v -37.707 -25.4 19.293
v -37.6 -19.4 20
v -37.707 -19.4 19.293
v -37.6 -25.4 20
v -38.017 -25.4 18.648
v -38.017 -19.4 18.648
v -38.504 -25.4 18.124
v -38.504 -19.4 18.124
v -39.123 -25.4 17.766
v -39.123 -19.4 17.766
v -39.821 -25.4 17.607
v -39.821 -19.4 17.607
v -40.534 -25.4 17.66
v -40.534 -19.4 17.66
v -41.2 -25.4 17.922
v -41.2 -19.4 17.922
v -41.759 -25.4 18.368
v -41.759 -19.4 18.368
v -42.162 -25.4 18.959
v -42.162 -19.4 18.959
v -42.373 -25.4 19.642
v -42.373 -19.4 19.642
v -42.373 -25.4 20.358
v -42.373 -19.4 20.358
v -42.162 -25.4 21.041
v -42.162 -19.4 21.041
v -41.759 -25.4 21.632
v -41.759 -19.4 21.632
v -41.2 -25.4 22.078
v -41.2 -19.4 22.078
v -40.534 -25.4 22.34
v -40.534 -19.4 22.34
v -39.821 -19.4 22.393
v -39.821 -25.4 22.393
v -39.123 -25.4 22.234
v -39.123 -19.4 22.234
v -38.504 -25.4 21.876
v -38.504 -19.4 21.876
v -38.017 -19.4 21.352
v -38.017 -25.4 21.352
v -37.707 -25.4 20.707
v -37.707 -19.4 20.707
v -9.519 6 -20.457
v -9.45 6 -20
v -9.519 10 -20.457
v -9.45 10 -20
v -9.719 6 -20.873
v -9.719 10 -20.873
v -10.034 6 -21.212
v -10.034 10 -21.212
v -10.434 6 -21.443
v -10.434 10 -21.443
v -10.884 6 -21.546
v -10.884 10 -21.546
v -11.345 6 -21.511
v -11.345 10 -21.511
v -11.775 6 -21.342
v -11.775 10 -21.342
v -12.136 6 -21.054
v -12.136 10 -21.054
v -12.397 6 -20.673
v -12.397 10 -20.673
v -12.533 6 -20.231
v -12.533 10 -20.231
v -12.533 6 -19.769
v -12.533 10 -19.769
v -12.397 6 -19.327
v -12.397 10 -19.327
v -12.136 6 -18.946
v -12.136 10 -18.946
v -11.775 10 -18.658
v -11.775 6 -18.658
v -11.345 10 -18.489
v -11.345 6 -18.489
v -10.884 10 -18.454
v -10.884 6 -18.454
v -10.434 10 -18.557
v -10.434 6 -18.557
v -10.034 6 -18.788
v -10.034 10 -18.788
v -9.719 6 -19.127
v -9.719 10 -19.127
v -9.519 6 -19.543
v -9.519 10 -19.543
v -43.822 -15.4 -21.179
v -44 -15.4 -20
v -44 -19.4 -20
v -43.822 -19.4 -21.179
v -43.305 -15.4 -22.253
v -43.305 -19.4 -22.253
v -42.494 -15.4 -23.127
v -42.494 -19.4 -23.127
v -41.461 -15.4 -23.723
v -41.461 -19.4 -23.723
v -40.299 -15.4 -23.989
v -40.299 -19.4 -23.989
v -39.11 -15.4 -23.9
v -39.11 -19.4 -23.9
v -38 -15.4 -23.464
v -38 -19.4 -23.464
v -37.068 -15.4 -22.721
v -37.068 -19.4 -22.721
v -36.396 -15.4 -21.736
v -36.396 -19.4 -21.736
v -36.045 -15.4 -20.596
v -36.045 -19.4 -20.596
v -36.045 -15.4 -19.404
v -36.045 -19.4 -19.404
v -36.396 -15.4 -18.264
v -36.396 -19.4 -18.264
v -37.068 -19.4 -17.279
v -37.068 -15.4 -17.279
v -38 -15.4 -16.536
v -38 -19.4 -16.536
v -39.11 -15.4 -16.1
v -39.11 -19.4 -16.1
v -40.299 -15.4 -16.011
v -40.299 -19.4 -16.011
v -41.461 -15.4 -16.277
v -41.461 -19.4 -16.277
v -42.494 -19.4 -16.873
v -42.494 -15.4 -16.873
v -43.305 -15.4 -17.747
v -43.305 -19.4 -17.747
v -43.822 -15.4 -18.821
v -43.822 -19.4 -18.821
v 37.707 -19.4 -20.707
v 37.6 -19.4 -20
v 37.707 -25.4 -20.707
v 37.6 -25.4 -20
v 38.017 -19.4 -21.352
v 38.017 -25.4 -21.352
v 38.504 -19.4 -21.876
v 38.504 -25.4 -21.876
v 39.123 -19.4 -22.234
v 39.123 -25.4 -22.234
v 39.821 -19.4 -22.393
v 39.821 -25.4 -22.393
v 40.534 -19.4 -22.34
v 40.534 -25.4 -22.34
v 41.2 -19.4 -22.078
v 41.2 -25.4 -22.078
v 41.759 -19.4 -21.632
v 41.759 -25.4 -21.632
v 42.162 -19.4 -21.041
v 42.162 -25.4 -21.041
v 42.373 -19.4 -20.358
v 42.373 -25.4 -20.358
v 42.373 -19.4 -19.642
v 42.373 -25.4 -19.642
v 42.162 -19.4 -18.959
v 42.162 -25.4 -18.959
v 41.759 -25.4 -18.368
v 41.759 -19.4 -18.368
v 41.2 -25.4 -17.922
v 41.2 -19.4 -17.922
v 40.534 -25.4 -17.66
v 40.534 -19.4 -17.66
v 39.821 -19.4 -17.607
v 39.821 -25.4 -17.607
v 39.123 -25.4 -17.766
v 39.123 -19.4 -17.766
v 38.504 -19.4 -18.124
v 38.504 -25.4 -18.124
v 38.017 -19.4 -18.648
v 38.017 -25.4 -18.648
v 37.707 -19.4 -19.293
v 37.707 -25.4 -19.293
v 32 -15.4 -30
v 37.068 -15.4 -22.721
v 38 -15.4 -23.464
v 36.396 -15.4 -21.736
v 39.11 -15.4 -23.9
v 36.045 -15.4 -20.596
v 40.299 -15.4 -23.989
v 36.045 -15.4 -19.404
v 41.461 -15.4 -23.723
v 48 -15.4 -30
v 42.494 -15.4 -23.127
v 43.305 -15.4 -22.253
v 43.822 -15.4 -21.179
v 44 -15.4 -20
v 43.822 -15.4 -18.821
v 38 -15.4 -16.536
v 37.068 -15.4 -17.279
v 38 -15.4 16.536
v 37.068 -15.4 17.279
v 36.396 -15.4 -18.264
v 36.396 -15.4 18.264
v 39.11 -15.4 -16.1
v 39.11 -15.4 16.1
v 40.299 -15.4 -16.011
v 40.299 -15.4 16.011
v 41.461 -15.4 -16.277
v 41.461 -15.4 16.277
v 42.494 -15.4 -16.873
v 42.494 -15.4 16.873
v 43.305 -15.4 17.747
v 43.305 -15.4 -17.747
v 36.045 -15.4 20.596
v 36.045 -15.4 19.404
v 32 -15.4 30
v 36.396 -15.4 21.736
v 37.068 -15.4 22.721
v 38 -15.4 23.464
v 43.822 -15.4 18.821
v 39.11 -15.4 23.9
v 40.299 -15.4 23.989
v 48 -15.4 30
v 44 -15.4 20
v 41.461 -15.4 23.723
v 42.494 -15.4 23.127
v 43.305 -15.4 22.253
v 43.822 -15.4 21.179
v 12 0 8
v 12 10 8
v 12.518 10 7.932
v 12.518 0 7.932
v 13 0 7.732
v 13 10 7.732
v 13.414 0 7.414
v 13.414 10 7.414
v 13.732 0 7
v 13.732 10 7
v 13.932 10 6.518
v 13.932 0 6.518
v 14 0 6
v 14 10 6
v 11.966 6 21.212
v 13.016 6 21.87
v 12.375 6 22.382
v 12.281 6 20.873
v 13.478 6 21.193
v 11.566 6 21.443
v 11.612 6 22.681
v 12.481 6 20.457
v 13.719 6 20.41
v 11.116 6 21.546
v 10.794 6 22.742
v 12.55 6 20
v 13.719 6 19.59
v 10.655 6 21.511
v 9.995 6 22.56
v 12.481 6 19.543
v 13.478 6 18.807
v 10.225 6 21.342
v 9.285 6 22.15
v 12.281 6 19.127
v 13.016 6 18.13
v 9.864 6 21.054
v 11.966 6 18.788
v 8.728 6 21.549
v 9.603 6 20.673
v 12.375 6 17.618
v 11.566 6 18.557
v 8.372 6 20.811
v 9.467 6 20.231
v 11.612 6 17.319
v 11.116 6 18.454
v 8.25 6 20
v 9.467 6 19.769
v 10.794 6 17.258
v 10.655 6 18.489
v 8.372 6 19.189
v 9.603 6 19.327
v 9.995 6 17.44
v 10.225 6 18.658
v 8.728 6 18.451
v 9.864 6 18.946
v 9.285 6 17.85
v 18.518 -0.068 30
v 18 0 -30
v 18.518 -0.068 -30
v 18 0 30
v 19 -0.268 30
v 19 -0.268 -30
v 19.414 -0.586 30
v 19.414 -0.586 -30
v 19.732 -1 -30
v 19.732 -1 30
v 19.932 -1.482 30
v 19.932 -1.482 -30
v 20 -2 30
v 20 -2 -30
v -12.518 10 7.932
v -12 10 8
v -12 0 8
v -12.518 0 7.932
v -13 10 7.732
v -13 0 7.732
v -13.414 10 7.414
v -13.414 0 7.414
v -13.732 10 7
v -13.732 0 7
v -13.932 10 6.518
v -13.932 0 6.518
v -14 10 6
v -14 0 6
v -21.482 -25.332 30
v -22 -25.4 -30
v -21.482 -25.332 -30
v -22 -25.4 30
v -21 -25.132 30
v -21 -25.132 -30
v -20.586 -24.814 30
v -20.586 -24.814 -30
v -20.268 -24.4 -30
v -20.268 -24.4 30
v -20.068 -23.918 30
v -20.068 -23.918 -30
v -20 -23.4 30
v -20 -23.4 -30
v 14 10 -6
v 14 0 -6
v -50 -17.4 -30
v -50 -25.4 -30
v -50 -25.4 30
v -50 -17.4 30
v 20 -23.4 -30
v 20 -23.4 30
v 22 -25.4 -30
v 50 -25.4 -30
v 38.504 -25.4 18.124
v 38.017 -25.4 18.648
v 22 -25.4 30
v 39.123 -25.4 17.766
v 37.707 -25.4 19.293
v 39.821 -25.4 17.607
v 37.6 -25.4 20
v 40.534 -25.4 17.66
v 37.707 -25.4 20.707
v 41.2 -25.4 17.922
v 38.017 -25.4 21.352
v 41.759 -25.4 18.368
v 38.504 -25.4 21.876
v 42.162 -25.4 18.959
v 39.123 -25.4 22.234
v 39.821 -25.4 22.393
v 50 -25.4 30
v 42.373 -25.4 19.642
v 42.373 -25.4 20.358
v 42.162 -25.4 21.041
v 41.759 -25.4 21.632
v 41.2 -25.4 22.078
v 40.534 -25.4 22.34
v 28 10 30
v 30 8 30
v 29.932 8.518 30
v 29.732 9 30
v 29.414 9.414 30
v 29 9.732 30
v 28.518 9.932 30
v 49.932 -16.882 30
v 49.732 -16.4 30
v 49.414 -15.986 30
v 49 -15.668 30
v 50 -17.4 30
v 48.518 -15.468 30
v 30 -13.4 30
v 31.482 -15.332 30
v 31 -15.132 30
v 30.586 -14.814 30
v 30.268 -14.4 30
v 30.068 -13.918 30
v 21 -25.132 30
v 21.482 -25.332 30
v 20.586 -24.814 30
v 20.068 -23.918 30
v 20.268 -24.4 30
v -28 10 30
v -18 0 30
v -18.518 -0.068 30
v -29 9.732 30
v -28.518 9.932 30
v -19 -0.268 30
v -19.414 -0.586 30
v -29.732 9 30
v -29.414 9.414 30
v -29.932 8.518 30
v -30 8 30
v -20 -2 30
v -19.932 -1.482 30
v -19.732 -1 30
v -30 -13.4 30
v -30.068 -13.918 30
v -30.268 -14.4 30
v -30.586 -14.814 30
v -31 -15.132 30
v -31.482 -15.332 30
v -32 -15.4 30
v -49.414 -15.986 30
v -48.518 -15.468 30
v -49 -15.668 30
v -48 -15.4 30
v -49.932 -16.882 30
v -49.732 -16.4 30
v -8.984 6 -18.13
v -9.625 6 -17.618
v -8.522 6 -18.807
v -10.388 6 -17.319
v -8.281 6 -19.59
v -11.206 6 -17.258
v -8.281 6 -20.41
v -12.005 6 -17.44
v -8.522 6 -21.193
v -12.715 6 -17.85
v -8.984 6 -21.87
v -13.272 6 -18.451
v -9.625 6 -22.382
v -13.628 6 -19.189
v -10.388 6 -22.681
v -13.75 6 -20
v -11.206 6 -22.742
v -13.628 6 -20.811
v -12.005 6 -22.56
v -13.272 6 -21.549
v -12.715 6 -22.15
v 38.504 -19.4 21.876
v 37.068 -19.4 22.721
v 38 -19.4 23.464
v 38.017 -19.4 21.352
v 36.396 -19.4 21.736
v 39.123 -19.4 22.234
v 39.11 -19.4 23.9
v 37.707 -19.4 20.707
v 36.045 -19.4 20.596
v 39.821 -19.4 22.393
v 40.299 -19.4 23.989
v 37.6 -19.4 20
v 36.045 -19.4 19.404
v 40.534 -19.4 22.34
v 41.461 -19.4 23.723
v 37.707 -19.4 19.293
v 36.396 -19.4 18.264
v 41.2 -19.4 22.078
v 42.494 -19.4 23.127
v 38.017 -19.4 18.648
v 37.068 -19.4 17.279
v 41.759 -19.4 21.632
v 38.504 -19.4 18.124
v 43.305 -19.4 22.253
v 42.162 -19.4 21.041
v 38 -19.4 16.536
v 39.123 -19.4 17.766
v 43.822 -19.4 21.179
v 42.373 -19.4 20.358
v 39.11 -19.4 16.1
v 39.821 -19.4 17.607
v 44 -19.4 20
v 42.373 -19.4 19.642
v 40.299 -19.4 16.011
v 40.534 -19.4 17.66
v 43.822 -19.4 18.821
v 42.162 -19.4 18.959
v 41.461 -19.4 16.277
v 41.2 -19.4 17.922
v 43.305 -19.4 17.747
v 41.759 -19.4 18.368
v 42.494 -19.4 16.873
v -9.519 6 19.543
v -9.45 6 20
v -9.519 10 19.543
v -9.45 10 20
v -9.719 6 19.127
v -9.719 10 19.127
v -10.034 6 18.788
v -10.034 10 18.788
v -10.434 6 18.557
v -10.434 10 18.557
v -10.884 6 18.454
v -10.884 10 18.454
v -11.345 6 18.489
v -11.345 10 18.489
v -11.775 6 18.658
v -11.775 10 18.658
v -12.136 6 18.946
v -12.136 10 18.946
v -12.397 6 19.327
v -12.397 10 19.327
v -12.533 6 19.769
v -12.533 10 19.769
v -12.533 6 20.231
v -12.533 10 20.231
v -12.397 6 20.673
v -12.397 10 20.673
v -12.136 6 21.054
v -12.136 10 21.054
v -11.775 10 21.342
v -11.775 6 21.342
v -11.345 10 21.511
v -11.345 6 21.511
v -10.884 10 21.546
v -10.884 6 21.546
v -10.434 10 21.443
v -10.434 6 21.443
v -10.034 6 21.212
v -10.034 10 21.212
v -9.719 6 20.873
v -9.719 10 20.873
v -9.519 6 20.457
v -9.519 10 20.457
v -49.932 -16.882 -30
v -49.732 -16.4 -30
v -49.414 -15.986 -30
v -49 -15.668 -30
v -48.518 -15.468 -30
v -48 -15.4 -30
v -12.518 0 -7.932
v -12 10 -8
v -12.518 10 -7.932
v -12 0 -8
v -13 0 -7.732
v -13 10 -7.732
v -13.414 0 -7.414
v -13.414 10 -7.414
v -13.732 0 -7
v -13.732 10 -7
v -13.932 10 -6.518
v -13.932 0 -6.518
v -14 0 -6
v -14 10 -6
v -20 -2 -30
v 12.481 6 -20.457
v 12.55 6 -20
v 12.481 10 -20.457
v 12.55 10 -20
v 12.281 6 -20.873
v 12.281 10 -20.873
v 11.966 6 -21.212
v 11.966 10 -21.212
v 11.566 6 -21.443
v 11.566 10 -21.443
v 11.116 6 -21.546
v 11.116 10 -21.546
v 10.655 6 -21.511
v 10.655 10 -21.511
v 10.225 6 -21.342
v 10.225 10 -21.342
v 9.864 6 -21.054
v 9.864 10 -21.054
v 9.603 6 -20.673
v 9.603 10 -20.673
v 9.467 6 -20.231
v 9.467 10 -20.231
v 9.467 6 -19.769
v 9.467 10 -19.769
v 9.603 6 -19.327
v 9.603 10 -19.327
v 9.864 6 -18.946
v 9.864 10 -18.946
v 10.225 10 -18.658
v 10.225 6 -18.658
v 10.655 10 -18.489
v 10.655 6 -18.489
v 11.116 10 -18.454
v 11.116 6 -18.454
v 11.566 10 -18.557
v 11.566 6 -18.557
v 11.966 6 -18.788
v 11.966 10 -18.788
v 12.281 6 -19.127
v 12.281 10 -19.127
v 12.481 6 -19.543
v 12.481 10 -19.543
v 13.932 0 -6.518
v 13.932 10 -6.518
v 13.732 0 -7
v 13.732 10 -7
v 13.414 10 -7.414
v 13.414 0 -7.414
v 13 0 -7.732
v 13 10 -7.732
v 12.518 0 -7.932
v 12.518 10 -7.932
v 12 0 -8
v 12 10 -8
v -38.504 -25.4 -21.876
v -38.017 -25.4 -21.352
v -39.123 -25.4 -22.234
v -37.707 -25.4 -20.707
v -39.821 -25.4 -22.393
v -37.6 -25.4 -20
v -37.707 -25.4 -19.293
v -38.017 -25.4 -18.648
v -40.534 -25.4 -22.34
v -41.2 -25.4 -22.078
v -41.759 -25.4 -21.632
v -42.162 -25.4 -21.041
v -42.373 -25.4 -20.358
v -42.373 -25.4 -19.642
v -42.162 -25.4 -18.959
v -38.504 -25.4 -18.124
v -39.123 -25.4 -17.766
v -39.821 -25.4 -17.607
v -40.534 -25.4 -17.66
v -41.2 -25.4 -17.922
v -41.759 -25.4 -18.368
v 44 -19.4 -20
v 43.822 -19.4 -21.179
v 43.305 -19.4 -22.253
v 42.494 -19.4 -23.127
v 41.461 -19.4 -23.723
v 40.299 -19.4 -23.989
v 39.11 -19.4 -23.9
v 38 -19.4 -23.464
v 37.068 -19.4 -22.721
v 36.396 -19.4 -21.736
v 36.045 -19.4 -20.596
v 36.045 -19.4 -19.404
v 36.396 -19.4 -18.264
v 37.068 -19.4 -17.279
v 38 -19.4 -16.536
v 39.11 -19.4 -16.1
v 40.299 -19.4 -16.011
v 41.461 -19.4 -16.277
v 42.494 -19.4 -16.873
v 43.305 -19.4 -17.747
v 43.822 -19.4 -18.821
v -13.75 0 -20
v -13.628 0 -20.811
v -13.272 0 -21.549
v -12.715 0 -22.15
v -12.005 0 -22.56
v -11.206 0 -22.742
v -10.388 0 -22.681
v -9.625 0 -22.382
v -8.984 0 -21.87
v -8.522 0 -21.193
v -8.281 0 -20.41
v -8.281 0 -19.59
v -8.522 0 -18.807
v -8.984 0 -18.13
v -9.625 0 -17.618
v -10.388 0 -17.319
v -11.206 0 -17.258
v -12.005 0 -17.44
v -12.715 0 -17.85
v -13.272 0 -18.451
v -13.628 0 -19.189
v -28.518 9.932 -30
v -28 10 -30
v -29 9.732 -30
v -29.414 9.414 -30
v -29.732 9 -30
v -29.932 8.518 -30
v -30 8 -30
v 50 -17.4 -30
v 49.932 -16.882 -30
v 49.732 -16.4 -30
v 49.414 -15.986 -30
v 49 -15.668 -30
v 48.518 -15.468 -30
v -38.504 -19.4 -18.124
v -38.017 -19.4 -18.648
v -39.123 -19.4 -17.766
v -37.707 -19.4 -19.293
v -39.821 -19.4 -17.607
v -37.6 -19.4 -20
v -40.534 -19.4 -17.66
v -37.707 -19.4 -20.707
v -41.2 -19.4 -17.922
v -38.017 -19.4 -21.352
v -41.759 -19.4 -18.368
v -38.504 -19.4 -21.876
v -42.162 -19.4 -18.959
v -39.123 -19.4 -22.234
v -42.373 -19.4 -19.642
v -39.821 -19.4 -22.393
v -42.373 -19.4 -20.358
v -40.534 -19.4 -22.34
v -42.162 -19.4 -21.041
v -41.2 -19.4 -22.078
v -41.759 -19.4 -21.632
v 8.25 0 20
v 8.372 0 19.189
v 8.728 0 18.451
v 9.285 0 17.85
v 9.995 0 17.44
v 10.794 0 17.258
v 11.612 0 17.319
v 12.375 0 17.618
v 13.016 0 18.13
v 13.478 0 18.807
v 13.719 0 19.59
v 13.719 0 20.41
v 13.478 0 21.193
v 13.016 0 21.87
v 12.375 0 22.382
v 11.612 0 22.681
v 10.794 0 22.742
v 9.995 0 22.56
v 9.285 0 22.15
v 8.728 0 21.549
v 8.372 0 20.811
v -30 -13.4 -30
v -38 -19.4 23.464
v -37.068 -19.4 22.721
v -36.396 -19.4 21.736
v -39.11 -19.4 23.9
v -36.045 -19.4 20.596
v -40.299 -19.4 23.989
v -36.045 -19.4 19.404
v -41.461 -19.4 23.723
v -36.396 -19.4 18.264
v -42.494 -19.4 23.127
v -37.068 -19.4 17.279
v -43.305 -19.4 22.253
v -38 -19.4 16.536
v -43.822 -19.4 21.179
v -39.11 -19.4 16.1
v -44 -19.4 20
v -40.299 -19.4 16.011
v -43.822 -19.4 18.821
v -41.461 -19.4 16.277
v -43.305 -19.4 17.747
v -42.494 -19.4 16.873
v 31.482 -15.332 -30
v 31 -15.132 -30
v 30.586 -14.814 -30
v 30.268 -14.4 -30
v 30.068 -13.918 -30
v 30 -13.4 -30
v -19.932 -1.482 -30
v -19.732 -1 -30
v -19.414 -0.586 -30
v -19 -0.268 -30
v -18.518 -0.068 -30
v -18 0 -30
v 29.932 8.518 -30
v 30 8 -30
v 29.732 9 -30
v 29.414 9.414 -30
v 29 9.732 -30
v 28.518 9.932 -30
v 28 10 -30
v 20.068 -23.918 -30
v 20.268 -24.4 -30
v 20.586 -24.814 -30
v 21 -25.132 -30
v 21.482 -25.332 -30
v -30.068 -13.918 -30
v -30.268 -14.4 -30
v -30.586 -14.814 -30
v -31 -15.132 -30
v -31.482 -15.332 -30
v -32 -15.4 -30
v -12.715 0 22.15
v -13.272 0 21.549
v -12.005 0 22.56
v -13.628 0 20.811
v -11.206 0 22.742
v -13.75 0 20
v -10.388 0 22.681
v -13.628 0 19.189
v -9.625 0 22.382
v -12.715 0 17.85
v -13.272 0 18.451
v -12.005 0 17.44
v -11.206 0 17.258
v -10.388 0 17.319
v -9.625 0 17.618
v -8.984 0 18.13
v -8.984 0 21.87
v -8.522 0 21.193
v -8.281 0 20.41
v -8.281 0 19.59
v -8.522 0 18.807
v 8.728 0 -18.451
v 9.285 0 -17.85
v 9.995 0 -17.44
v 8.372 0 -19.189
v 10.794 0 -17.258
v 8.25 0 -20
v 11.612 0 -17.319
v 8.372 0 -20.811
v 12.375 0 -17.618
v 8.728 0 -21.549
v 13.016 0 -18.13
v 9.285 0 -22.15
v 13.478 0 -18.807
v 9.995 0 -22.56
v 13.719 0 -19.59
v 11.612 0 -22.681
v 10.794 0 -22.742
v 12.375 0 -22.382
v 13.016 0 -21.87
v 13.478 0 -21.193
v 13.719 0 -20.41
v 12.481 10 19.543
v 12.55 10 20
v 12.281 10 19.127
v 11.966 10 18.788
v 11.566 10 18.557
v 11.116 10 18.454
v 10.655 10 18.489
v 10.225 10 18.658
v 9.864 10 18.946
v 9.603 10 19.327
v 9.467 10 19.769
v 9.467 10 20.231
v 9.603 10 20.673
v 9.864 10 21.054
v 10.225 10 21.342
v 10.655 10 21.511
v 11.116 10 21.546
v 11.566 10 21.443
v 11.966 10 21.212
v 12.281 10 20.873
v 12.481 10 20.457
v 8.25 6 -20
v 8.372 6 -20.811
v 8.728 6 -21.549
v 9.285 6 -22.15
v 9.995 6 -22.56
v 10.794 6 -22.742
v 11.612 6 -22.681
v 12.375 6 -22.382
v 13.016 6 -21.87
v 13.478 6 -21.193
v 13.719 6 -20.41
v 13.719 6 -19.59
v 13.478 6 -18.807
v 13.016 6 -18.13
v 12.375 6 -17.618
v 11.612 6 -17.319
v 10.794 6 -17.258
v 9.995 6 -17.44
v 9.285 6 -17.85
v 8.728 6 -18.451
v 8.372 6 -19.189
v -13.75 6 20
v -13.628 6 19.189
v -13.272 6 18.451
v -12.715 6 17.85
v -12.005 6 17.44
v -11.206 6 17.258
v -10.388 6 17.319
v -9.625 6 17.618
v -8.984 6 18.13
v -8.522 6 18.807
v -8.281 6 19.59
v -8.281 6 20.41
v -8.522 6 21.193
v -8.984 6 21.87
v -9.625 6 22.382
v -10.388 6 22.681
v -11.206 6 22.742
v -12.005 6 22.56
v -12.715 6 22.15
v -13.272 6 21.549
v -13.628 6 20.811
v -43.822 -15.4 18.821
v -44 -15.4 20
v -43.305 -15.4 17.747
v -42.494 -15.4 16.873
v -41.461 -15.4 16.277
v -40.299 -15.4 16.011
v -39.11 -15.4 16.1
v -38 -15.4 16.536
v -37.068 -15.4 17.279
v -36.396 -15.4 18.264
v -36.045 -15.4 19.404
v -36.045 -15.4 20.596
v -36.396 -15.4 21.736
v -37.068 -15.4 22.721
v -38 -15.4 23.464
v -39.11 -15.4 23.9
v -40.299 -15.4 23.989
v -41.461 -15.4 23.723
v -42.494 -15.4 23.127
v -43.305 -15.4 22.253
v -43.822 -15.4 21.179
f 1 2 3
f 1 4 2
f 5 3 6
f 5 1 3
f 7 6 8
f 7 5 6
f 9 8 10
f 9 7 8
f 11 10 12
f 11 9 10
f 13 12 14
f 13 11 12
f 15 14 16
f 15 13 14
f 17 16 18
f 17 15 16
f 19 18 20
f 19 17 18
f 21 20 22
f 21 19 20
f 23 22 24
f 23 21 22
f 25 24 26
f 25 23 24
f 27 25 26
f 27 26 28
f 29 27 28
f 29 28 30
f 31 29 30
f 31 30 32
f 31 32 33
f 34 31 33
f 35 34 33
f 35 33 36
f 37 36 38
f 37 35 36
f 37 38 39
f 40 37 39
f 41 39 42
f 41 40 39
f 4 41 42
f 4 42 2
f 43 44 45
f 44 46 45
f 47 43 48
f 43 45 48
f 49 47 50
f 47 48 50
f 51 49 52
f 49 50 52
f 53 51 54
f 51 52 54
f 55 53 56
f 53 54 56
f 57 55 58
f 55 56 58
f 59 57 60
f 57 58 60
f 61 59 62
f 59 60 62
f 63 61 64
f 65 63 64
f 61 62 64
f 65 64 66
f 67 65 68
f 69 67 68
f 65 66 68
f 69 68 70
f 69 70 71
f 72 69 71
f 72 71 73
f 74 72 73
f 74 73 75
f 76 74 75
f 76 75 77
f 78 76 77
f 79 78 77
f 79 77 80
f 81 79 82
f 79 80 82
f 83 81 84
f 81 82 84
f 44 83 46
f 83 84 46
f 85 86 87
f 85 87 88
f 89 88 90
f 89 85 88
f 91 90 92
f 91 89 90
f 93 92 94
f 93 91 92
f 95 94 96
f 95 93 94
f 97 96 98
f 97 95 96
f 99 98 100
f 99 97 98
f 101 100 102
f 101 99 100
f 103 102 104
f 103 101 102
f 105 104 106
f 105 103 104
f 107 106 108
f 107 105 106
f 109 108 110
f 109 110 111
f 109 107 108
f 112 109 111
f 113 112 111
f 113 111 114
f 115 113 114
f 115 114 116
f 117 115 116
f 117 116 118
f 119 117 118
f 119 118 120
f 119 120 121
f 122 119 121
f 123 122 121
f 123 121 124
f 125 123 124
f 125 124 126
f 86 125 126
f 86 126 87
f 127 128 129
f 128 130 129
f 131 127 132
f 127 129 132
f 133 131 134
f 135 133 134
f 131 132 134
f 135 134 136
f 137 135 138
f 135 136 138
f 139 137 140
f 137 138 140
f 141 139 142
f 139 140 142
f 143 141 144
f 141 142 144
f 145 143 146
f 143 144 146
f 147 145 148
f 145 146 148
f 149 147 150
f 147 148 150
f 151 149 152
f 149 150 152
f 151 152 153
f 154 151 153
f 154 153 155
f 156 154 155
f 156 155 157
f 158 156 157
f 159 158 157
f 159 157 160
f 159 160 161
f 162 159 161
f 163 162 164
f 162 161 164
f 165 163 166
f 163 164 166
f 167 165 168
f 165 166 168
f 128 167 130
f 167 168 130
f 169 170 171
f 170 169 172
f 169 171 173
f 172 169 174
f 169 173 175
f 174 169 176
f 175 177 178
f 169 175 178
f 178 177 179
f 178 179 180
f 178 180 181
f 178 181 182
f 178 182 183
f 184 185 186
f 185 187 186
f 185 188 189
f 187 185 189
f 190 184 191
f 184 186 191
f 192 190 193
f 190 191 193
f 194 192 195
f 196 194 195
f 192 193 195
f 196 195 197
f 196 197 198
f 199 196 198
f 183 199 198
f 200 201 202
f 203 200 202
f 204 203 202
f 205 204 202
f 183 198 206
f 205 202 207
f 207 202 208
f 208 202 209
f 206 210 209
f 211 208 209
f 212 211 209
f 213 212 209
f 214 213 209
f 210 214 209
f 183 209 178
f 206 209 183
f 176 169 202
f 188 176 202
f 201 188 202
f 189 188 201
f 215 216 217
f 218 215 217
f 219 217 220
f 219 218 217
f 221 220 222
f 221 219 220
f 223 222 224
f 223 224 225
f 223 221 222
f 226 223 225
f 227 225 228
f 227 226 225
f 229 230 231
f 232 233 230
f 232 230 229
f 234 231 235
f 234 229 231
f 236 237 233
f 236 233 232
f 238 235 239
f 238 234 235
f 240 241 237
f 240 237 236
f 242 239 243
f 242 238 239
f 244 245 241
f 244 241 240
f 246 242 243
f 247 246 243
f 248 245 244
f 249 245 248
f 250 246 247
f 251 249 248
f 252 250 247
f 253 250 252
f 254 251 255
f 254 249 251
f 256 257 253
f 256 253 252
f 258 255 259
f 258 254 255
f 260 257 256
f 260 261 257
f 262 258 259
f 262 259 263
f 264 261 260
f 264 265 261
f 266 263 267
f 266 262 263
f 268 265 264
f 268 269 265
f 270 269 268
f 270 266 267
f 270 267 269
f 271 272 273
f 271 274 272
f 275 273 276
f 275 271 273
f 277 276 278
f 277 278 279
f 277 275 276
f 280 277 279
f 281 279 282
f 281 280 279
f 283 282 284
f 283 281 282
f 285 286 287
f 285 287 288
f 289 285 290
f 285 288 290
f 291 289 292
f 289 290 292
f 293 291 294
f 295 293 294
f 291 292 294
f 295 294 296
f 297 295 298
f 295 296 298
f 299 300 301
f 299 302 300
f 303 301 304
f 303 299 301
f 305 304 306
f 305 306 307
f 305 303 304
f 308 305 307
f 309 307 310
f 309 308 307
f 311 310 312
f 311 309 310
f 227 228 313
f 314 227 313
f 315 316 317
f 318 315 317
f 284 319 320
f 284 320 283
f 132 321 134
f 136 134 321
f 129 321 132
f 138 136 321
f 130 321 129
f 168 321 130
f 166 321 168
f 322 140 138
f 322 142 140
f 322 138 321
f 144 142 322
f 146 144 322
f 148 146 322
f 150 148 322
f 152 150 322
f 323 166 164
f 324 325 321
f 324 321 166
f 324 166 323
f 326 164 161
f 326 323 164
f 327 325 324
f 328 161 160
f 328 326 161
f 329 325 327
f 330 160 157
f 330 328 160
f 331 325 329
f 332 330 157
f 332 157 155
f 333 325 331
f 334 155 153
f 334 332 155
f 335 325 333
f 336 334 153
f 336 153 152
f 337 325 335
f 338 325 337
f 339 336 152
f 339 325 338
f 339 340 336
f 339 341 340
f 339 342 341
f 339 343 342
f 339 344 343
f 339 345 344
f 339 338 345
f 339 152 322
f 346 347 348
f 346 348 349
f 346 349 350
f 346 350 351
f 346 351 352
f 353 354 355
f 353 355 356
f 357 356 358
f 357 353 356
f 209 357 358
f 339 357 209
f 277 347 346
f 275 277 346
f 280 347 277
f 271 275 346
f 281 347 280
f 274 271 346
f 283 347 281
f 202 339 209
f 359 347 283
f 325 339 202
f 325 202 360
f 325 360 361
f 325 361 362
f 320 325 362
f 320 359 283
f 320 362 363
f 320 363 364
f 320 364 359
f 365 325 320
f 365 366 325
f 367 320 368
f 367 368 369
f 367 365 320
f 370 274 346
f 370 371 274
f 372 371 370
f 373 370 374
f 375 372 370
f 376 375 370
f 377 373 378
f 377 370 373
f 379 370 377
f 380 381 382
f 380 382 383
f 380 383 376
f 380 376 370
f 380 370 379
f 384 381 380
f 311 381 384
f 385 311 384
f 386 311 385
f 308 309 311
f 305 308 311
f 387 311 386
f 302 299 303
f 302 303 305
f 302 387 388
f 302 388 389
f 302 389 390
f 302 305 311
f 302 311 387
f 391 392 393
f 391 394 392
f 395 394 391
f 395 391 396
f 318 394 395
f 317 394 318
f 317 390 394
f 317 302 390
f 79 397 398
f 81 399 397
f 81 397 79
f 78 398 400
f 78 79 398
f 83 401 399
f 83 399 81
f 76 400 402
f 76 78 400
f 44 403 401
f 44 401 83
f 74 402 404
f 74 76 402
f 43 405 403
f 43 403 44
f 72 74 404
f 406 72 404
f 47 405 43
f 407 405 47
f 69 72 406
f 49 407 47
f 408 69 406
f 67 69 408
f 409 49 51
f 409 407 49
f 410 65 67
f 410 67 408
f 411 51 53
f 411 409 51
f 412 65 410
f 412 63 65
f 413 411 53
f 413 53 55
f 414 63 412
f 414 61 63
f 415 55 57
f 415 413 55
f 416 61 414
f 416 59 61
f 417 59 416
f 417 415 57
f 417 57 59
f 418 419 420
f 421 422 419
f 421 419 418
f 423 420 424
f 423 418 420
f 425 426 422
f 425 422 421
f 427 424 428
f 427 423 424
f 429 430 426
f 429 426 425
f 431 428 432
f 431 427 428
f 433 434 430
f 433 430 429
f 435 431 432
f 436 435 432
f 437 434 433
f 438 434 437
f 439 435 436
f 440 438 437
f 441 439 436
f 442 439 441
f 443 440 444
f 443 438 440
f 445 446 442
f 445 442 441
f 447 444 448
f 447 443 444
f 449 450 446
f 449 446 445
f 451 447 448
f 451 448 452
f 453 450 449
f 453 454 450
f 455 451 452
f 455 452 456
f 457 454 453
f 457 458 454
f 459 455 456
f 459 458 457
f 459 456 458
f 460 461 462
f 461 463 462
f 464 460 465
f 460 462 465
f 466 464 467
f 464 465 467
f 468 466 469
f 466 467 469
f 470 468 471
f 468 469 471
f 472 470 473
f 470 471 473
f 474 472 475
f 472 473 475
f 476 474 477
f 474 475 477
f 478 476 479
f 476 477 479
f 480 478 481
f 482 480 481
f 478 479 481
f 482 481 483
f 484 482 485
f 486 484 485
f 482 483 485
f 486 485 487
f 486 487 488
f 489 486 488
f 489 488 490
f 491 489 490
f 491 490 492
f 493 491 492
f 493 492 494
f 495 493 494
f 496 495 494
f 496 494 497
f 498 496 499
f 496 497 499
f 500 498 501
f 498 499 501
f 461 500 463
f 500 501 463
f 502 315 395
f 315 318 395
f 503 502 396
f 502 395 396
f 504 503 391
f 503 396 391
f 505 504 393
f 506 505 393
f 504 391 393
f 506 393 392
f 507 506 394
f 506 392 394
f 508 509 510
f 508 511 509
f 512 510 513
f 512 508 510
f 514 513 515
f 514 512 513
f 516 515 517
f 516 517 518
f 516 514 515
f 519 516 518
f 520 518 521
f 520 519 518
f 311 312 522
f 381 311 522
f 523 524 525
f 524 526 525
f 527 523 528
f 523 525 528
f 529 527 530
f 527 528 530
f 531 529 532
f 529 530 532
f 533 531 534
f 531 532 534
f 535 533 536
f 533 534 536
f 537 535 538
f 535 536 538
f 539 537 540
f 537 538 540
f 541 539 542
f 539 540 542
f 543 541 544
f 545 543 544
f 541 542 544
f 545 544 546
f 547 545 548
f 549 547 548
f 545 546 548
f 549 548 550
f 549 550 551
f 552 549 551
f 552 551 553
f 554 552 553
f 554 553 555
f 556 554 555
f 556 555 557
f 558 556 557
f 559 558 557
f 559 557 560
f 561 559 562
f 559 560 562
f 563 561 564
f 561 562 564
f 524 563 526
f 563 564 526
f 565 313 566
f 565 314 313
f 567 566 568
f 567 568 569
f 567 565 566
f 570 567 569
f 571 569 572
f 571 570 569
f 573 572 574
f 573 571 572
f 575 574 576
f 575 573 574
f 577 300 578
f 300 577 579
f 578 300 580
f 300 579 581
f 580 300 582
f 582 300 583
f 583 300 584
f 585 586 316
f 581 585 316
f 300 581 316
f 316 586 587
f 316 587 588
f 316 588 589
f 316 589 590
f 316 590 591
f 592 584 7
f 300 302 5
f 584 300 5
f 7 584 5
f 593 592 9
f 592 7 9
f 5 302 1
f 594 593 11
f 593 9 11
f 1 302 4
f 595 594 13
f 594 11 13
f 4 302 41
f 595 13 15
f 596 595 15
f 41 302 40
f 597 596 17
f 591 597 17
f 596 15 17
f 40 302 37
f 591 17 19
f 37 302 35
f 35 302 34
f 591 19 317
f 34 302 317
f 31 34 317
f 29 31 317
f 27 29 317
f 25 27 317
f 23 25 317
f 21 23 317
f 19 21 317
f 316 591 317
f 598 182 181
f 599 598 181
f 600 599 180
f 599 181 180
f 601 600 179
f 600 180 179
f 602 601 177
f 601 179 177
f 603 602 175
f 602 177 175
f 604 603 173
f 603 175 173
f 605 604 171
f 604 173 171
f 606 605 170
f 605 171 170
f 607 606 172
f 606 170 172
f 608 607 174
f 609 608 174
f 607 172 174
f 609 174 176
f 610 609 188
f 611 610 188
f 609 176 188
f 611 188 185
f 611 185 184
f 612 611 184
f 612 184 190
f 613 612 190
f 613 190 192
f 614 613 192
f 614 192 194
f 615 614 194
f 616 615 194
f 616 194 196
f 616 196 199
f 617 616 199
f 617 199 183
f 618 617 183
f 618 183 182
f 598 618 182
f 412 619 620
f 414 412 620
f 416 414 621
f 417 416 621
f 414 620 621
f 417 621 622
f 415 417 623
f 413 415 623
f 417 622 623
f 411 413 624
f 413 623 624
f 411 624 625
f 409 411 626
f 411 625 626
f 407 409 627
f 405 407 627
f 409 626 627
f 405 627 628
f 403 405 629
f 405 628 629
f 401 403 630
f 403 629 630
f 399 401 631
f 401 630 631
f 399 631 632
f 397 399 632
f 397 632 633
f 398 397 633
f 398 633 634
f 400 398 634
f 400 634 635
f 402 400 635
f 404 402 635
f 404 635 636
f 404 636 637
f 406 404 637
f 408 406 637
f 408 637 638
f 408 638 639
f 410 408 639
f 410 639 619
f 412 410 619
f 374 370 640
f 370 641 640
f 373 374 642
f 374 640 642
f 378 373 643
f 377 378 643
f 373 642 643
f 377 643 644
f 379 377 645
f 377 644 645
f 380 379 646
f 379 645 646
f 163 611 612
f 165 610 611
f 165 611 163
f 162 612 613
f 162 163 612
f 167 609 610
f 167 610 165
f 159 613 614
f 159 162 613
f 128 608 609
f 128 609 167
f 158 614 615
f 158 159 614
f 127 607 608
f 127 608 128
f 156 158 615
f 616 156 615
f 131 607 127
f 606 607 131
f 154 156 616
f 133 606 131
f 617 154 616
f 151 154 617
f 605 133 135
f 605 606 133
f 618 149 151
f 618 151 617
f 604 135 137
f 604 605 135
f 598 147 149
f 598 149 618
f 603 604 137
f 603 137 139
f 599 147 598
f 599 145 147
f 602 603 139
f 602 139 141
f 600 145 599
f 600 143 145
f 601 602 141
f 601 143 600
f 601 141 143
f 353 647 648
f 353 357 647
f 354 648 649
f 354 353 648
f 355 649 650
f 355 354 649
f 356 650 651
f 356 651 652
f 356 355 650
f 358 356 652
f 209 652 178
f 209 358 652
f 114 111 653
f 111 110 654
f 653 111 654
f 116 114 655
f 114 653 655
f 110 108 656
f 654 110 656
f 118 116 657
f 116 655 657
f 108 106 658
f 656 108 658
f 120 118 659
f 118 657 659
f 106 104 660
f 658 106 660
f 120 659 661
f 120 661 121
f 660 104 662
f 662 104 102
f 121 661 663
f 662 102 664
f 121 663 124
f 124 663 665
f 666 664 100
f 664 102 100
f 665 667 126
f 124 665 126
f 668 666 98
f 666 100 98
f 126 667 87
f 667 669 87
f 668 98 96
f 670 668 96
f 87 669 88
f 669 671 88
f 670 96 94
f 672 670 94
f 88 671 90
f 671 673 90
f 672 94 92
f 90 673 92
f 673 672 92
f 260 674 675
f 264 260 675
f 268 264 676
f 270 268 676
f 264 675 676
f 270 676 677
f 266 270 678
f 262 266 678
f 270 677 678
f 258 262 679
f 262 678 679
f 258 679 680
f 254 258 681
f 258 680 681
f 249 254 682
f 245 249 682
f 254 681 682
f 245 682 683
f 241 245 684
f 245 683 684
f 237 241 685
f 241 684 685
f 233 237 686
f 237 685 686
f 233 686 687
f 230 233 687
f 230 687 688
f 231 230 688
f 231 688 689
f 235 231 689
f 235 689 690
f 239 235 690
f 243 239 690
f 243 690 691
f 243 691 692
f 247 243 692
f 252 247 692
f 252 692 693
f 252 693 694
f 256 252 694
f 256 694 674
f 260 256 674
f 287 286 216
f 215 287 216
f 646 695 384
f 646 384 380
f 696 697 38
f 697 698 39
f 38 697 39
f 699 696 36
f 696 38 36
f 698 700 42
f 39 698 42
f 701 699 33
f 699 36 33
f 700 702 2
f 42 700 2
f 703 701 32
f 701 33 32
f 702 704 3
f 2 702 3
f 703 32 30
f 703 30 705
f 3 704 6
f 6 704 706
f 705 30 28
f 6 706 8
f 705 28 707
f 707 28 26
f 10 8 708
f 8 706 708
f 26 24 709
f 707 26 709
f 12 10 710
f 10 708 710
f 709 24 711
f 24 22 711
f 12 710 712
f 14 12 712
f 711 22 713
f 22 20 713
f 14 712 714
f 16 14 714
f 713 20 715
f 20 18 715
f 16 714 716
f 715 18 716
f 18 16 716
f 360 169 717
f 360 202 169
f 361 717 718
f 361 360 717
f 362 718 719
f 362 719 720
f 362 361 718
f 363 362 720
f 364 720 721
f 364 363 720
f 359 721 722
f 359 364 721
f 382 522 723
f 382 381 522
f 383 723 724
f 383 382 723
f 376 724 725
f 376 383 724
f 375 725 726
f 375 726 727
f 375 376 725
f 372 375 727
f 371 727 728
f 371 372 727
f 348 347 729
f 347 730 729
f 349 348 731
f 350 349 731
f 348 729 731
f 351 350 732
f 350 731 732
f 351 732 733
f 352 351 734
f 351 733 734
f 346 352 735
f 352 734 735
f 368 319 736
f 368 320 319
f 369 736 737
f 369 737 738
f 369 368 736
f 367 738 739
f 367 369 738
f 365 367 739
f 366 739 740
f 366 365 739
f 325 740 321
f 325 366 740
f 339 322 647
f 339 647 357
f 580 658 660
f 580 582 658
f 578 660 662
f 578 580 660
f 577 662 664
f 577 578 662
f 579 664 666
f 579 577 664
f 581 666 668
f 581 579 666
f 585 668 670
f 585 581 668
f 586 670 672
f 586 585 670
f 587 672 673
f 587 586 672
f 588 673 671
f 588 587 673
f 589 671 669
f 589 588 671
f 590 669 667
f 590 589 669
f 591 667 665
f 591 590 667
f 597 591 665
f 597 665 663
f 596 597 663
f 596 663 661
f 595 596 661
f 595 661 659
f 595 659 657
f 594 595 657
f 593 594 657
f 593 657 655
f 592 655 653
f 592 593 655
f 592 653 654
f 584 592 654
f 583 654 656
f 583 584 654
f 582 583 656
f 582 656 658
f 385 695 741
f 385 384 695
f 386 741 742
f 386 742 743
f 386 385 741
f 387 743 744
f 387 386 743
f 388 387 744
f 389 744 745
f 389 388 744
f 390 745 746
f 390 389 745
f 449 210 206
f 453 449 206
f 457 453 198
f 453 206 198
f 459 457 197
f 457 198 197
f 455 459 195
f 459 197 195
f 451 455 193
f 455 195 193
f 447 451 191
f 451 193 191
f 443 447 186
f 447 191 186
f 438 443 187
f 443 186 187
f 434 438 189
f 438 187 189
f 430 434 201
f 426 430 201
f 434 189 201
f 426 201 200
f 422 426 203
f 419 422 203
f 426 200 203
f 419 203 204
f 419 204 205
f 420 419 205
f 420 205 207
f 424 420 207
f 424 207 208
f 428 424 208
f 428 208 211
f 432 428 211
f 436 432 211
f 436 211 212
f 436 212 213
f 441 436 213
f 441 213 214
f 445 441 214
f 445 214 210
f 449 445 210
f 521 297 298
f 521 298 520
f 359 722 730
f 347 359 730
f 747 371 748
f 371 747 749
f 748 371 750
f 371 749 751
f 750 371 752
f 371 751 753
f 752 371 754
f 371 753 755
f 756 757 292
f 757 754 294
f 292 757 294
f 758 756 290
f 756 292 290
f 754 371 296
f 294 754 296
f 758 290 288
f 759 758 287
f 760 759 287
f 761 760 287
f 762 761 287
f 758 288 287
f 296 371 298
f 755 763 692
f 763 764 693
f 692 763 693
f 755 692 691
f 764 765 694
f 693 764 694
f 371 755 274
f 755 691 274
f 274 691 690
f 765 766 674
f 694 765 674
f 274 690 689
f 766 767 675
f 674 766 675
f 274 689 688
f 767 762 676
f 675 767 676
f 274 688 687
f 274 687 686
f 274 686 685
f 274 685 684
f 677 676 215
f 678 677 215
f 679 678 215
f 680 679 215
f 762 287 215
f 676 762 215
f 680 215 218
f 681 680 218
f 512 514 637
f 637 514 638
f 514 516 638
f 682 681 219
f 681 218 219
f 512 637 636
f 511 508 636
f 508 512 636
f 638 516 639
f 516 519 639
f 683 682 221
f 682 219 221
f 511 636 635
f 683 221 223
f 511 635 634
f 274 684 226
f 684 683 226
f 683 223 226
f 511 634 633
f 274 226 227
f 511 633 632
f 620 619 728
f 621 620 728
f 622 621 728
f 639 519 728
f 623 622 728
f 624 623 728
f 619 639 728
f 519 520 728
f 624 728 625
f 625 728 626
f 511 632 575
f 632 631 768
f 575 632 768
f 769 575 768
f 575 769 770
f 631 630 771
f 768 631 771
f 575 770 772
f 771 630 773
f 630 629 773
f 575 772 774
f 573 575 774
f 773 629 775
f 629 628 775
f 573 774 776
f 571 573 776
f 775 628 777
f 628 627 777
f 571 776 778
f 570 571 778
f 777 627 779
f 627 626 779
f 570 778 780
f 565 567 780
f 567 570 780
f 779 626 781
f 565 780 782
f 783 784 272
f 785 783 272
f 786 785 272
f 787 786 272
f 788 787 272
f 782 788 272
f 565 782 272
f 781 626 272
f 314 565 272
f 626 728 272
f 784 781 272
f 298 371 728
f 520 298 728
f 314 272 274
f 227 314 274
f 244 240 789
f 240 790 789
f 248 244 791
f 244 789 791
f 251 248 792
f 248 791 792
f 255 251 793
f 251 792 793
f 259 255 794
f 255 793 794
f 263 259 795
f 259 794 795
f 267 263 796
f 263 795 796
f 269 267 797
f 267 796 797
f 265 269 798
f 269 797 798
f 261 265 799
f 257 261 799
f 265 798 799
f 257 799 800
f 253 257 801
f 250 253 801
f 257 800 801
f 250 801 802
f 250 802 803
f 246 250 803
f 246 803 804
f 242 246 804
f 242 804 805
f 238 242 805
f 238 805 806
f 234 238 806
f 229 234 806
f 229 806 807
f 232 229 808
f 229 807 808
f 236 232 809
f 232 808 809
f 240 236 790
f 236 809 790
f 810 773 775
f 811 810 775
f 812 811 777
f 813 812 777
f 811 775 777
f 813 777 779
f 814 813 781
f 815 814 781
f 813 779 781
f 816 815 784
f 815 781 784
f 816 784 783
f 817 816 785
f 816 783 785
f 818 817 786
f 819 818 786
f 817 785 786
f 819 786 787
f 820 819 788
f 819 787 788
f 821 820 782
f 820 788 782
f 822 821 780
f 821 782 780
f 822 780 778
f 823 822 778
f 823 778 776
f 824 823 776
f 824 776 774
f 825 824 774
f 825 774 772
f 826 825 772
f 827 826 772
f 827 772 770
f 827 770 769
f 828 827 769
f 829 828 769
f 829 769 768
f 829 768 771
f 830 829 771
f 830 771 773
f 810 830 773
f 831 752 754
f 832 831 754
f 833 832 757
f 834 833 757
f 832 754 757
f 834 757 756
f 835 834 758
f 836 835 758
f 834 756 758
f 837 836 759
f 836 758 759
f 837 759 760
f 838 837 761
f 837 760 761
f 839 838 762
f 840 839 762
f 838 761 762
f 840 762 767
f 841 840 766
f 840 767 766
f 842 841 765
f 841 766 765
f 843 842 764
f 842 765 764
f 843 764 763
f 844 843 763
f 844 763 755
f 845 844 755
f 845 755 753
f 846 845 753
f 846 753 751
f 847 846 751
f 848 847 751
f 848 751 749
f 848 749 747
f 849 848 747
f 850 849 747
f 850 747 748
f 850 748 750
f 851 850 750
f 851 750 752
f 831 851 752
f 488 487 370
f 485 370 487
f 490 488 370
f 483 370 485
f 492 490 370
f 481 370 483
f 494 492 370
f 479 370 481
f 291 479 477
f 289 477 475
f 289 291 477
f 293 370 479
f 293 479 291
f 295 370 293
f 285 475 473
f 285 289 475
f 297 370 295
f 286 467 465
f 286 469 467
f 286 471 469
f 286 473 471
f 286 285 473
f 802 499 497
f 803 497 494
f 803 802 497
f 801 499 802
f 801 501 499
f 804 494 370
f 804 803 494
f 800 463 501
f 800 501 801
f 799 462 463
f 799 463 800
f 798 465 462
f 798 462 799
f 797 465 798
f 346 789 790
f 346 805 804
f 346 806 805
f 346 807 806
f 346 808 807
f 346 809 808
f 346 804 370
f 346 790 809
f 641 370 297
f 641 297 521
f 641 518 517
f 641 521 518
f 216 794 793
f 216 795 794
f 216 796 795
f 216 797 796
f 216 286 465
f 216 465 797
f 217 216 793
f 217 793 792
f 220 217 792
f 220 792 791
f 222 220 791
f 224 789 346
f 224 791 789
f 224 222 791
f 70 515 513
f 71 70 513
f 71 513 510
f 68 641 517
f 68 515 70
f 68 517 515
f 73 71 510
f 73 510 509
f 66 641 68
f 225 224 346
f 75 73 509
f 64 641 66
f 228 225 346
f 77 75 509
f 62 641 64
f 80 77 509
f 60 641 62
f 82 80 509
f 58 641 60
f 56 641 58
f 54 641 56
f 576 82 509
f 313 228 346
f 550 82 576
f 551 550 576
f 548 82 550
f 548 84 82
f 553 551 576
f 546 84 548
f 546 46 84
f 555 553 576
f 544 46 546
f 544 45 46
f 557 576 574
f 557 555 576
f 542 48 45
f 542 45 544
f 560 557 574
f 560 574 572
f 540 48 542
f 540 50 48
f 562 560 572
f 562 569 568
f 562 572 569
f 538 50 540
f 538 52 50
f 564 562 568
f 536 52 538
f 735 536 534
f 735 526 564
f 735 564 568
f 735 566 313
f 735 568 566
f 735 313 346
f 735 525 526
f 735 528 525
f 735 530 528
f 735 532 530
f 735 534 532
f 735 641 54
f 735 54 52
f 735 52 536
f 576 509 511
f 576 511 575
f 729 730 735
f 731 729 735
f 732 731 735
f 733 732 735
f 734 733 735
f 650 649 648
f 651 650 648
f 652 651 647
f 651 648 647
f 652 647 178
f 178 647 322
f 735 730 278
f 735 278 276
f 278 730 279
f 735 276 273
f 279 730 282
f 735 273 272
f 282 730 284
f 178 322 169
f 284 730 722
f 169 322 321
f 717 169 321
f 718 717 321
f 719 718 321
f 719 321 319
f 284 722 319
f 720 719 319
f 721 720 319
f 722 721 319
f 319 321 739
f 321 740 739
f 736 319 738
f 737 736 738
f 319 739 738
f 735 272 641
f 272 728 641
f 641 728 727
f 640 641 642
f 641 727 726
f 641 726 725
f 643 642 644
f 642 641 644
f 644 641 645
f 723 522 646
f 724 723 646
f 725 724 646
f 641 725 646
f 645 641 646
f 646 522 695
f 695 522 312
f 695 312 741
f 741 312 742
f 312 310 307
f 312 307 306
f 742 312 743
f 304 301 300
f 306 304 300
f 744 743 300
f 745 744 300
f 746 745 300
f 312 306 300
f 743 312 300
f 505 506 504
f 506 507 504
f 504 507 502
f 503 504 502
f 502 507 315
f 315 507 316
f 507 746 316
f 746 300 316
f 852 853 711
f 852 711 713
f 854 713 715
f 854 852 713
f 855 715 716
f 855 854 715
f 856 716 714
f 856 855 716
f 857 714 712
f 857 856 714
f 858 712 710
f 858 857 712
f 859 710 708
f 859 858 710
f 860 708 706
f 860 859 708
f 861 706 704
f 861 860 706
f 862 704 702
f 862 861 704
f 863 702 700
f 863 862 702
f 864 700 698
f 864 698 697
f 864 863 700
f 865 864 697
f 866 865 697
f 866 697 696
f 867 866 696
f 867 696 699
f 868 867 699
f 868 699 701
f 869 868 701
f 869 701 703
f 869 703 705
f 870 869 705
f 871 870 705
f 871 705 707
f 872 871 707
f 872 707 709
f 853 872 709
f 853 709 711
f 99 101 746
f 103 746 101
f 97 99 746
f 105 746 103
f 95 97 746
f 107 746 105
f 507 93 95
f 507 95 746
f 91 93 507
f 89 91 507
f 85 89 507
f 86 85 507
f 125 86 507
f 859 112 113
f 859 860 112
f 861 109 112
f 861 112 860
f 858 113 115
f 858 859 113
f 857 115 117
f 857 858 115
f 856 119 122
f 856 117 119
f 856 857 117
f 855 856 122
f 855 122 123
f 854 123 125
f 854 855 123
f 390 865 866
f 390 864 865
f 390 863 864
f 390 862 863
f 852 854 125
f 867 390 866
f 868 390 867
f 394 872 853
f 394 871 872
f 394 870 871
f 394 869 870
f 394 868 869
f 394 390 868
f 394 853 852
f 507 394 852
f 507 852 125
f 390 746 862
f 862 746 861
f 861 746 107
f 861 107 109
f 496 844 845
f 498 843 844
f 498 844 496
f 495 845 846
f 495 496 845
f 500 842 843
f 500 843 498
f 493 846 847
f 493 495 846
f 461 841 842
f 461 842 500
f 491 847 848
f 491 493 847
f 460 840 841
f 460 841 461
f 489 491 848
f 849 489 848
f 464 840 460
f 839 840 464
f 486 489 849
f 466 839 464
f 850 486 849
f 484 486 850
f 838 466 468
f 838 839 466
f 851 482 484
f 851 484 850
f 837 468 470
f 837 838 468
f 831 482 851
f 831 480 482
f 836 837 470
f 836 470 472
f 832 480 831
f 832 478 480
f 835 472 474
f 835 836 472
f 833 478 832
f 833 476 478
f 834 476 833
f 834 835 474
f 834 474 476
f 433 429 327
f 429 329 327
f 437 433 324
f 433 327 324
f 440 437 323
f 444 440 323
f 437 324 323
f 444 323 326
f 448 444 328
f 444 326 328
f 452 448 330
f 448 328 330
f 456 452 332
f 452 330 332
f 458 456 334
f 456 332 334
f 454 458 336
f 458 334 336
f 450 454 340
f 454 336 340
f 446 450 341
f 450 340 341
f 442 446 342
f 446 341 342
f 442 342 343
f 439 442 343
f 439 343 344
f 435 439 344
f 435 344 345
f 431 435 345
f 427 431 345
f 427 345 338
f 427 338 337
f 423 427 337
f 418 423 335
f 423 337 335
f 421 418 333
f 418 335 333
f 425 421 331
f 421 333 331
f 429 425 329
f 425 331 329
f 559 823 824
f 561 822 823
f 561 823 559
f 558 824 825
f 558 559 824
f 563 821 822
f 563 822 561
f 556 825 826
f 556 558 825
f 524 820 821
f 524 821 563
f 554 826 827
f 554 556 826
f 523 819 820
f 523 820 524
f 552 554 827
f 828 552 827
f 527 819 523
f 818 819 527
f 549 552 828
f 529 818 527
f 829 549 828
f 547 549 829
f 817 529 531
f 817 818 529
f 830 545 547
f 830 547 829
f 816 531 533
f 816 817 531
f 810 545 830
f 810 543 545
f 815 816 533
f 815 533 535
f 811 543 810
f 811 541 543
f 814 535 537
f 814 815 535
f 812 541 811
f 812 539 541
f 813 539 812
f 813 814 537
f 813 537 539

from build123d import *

# Parameters (mm, degrees)
SKETCH2_W                        = 60
SKETCH2_H                        = 60
BOSS_EXTRUDE1_DEPTH              = 10
SKETCH7_W                        = 28
SKETCH7_H                        = 16
CUT_EXTRUDE2_DEPTH               = 44.588989435
FILLET2_R                        = 2
CBORE_FOR_M2_5_SHCS2_D           = 3.1
CBORE_FOR_M2_5_SHCS2_CBORE_D     = 5.5
CBORE_FOR_M2_5_SHCS2_CBORE_DEPTH = 2.5
MOVE_FACE1_BY                    = 3.5
MOVE_FACE1_2_BY                  = 3.5
MOVE_FACE1_3_BY                  = 3.5
MOVE_FACE1_4_BY                  = 3.5
SKETCH11_W                       = 10
SKETCH11_H                       = 25.4
BOSS_EXTRUDE2_DEPTH              = 60
SKETCH12_W                       = 20
SKETCH12_H                       = 60
BOSS_EXTRUDE3_DEPTH              = 10
CBORE_FOR_M4_SHCS1_D             = 4.8
CBORE_FOR_M4_SHCS1_CBORE_D       = 8
CBORE_FOR_M4_SHCS1_CBORE_DEPTH   = 4
FILLET5_R                        = 2


with BuildPart() as part:
    # Sketch2 → Boss-Extrude1 (new body)
    with BuildSketch(Plane(origin=(0, 0, 0), x_dir=(1, 0, 0), z_dir=(0, 1, 0))):
        Rectangle(SKETCH2_W, SKETCH2_H)
    extrude(amount=BOSS_EXTRUDE1_DEPTH)

    # Sketch7 → Cut-Extrude2 (cut, through all)
    with BuildSketch(Plane(origin=(0, 10, 0), x_dir=(1, 0, 0), z_dir=(0, 1, 0))):
        Rectangle(SKETCH7_W, SKETCH7_H)
    extrude(amount=-CUT_EXTRUDE2_DEPTH, mode=Mode.SUBTRACT)

    # Fillet2
    fillet2_edges = [part.edges().sort_by_distance(p)[0] for p in [
        (-14, 5, 8),
        (-14, 5, -8),
        (14, 5, -8),
        (14, 5, 8),
    ]]
    fillet(fillet2_edges, radius=FILLET2_R)

    # CBORE for M2.5 SHCS2 (through all)
    with Locations(Plane(origin=(0, 0, 0), x_dir=(-1, 0, 0), z_dir=(0, -1, 0))):
        with Locations((11, -20), (-11, -20), (11, 20), (-11, 20)):
            CounterBoreHole(CBORE_FOR_M2_5_SHCS2_D / 2, CBORE_FOR_M2_5_SHCS2_CBORE_D / 2, CBORE_FOR_M2_5_SHCS2_CBORE_DEPTH)

    # Move Face1: a face moved inward by 3.5
    extrude(part.faces().sort_by_distance((11, 2.5, -17.8))[0], amount=MOVE_FACE1_BY, dir=(0, 1, 0), mode=Mode.SUBTRACT)

    # Move Face1 2: a face moved inward by 3.5
    extrude(part.faces().sort_by_distance((-11, 2.5, -17.8))[0], amount=MOVE_FACE1_2_BY, dir=(0, 1, 0), mode=Mode.SUBTRACT)

    # Move Face1 3: a face moved inward by 3.5
    extrude(part.faces().sort_by_distance((11, 2.5, 22.2))[0], amount=MOVE_FACE1_3_BY, dir=(0, 1, 0), mode=Mode.SUBTRACT)

    # Move Face1 4: a face moved inward by 3.5
    extrude(part.faces().sort_by_distance((-11, 2.5, 22.2))[0], amount=MOVE_FACE1_4_BY, dir=(0, 1, 0), mode=Mode.SUBTRACT)

    # Sketch11 → Boss-Extrude2 (add)
    with BuildSketch(Plane(origin=(0, 0, -30), x_dir=(-1, 0, 0), z_dir=(0, 0, -1))):
        with Locations((-25, -12.7)):
            Rectangle(SKETCH11_W, SKETCH11_H)
    boss_extrude2 = extrude(amount=-BOSS_EXTRUDE2_DEPTH)

    # Sketch12 → Boss-Extrude3 (add)
    with BuildSketch(Plane.XZ.offset(25.4)):
        with Locations((40, 0)):
            Rectangle(SKETCH12_W, SKETCH12_H)
    boss_extrude3 = extrude(amount=-BOSS_EXTRUDE3_DEPTH)

    # CBORE for M4 SHCS1 (through all)
    with Locations(Plane(origin=(0, -15.4, 0), x_dir=(1, 0, 0), z_dir=(0, 1, 0))):
        with Locations((40, 20), (40, -20)):
            cbore_for_m4_shcs1 = CounterBoreHole(CBORE_FOR_M4_SHCS1_D / 2, CBORE_FOR_M4_SHCS1_CBORE_D / 2, CBORE_FOR_M4_SHCS1_CBORE_DEPTH)

    # Mirror1: Boss-Extrude2, Boss-Extrude3, CBORE for M4 SHCS1 across plane
    add(boss_extrude2.mirror(Plane(origin=(0, 0, 0), x_dir=(0, 0, 1), z_dir=(1, 0, 0))))
    add(boss_extrude3.mirror(Plane(origin=(0, 0, 0), x_dir=(0, 0, 1), z_dir=(1, 0, 0))))
    add(cbore_for_m4_shcs1.mirror(Plane(origin=(0, 0, 0), x_dir=(0, 0, 1), z_dir=(1, 0, 0))), mode=Mode.SUBTRACT)

    # Fillet5
    fillet5_edges = [part.edges().sort_by_distance(p)[0] for p in [
        (50, -15.4, 0),
        (30, -15.4, 0),
        (30, 10, 0),
        (-20, 0, 0),
        (-20, -25.4, 0),
        (-30, -15.4, 0),
        (-50, -15.4, 0),
        (-30, 10, 0),
        (20, 0, 0),
        (20, -25.4, 0),
    ]]
    fillet(fillet5_edges, radius=FILLET5_R)


solid = part.part
